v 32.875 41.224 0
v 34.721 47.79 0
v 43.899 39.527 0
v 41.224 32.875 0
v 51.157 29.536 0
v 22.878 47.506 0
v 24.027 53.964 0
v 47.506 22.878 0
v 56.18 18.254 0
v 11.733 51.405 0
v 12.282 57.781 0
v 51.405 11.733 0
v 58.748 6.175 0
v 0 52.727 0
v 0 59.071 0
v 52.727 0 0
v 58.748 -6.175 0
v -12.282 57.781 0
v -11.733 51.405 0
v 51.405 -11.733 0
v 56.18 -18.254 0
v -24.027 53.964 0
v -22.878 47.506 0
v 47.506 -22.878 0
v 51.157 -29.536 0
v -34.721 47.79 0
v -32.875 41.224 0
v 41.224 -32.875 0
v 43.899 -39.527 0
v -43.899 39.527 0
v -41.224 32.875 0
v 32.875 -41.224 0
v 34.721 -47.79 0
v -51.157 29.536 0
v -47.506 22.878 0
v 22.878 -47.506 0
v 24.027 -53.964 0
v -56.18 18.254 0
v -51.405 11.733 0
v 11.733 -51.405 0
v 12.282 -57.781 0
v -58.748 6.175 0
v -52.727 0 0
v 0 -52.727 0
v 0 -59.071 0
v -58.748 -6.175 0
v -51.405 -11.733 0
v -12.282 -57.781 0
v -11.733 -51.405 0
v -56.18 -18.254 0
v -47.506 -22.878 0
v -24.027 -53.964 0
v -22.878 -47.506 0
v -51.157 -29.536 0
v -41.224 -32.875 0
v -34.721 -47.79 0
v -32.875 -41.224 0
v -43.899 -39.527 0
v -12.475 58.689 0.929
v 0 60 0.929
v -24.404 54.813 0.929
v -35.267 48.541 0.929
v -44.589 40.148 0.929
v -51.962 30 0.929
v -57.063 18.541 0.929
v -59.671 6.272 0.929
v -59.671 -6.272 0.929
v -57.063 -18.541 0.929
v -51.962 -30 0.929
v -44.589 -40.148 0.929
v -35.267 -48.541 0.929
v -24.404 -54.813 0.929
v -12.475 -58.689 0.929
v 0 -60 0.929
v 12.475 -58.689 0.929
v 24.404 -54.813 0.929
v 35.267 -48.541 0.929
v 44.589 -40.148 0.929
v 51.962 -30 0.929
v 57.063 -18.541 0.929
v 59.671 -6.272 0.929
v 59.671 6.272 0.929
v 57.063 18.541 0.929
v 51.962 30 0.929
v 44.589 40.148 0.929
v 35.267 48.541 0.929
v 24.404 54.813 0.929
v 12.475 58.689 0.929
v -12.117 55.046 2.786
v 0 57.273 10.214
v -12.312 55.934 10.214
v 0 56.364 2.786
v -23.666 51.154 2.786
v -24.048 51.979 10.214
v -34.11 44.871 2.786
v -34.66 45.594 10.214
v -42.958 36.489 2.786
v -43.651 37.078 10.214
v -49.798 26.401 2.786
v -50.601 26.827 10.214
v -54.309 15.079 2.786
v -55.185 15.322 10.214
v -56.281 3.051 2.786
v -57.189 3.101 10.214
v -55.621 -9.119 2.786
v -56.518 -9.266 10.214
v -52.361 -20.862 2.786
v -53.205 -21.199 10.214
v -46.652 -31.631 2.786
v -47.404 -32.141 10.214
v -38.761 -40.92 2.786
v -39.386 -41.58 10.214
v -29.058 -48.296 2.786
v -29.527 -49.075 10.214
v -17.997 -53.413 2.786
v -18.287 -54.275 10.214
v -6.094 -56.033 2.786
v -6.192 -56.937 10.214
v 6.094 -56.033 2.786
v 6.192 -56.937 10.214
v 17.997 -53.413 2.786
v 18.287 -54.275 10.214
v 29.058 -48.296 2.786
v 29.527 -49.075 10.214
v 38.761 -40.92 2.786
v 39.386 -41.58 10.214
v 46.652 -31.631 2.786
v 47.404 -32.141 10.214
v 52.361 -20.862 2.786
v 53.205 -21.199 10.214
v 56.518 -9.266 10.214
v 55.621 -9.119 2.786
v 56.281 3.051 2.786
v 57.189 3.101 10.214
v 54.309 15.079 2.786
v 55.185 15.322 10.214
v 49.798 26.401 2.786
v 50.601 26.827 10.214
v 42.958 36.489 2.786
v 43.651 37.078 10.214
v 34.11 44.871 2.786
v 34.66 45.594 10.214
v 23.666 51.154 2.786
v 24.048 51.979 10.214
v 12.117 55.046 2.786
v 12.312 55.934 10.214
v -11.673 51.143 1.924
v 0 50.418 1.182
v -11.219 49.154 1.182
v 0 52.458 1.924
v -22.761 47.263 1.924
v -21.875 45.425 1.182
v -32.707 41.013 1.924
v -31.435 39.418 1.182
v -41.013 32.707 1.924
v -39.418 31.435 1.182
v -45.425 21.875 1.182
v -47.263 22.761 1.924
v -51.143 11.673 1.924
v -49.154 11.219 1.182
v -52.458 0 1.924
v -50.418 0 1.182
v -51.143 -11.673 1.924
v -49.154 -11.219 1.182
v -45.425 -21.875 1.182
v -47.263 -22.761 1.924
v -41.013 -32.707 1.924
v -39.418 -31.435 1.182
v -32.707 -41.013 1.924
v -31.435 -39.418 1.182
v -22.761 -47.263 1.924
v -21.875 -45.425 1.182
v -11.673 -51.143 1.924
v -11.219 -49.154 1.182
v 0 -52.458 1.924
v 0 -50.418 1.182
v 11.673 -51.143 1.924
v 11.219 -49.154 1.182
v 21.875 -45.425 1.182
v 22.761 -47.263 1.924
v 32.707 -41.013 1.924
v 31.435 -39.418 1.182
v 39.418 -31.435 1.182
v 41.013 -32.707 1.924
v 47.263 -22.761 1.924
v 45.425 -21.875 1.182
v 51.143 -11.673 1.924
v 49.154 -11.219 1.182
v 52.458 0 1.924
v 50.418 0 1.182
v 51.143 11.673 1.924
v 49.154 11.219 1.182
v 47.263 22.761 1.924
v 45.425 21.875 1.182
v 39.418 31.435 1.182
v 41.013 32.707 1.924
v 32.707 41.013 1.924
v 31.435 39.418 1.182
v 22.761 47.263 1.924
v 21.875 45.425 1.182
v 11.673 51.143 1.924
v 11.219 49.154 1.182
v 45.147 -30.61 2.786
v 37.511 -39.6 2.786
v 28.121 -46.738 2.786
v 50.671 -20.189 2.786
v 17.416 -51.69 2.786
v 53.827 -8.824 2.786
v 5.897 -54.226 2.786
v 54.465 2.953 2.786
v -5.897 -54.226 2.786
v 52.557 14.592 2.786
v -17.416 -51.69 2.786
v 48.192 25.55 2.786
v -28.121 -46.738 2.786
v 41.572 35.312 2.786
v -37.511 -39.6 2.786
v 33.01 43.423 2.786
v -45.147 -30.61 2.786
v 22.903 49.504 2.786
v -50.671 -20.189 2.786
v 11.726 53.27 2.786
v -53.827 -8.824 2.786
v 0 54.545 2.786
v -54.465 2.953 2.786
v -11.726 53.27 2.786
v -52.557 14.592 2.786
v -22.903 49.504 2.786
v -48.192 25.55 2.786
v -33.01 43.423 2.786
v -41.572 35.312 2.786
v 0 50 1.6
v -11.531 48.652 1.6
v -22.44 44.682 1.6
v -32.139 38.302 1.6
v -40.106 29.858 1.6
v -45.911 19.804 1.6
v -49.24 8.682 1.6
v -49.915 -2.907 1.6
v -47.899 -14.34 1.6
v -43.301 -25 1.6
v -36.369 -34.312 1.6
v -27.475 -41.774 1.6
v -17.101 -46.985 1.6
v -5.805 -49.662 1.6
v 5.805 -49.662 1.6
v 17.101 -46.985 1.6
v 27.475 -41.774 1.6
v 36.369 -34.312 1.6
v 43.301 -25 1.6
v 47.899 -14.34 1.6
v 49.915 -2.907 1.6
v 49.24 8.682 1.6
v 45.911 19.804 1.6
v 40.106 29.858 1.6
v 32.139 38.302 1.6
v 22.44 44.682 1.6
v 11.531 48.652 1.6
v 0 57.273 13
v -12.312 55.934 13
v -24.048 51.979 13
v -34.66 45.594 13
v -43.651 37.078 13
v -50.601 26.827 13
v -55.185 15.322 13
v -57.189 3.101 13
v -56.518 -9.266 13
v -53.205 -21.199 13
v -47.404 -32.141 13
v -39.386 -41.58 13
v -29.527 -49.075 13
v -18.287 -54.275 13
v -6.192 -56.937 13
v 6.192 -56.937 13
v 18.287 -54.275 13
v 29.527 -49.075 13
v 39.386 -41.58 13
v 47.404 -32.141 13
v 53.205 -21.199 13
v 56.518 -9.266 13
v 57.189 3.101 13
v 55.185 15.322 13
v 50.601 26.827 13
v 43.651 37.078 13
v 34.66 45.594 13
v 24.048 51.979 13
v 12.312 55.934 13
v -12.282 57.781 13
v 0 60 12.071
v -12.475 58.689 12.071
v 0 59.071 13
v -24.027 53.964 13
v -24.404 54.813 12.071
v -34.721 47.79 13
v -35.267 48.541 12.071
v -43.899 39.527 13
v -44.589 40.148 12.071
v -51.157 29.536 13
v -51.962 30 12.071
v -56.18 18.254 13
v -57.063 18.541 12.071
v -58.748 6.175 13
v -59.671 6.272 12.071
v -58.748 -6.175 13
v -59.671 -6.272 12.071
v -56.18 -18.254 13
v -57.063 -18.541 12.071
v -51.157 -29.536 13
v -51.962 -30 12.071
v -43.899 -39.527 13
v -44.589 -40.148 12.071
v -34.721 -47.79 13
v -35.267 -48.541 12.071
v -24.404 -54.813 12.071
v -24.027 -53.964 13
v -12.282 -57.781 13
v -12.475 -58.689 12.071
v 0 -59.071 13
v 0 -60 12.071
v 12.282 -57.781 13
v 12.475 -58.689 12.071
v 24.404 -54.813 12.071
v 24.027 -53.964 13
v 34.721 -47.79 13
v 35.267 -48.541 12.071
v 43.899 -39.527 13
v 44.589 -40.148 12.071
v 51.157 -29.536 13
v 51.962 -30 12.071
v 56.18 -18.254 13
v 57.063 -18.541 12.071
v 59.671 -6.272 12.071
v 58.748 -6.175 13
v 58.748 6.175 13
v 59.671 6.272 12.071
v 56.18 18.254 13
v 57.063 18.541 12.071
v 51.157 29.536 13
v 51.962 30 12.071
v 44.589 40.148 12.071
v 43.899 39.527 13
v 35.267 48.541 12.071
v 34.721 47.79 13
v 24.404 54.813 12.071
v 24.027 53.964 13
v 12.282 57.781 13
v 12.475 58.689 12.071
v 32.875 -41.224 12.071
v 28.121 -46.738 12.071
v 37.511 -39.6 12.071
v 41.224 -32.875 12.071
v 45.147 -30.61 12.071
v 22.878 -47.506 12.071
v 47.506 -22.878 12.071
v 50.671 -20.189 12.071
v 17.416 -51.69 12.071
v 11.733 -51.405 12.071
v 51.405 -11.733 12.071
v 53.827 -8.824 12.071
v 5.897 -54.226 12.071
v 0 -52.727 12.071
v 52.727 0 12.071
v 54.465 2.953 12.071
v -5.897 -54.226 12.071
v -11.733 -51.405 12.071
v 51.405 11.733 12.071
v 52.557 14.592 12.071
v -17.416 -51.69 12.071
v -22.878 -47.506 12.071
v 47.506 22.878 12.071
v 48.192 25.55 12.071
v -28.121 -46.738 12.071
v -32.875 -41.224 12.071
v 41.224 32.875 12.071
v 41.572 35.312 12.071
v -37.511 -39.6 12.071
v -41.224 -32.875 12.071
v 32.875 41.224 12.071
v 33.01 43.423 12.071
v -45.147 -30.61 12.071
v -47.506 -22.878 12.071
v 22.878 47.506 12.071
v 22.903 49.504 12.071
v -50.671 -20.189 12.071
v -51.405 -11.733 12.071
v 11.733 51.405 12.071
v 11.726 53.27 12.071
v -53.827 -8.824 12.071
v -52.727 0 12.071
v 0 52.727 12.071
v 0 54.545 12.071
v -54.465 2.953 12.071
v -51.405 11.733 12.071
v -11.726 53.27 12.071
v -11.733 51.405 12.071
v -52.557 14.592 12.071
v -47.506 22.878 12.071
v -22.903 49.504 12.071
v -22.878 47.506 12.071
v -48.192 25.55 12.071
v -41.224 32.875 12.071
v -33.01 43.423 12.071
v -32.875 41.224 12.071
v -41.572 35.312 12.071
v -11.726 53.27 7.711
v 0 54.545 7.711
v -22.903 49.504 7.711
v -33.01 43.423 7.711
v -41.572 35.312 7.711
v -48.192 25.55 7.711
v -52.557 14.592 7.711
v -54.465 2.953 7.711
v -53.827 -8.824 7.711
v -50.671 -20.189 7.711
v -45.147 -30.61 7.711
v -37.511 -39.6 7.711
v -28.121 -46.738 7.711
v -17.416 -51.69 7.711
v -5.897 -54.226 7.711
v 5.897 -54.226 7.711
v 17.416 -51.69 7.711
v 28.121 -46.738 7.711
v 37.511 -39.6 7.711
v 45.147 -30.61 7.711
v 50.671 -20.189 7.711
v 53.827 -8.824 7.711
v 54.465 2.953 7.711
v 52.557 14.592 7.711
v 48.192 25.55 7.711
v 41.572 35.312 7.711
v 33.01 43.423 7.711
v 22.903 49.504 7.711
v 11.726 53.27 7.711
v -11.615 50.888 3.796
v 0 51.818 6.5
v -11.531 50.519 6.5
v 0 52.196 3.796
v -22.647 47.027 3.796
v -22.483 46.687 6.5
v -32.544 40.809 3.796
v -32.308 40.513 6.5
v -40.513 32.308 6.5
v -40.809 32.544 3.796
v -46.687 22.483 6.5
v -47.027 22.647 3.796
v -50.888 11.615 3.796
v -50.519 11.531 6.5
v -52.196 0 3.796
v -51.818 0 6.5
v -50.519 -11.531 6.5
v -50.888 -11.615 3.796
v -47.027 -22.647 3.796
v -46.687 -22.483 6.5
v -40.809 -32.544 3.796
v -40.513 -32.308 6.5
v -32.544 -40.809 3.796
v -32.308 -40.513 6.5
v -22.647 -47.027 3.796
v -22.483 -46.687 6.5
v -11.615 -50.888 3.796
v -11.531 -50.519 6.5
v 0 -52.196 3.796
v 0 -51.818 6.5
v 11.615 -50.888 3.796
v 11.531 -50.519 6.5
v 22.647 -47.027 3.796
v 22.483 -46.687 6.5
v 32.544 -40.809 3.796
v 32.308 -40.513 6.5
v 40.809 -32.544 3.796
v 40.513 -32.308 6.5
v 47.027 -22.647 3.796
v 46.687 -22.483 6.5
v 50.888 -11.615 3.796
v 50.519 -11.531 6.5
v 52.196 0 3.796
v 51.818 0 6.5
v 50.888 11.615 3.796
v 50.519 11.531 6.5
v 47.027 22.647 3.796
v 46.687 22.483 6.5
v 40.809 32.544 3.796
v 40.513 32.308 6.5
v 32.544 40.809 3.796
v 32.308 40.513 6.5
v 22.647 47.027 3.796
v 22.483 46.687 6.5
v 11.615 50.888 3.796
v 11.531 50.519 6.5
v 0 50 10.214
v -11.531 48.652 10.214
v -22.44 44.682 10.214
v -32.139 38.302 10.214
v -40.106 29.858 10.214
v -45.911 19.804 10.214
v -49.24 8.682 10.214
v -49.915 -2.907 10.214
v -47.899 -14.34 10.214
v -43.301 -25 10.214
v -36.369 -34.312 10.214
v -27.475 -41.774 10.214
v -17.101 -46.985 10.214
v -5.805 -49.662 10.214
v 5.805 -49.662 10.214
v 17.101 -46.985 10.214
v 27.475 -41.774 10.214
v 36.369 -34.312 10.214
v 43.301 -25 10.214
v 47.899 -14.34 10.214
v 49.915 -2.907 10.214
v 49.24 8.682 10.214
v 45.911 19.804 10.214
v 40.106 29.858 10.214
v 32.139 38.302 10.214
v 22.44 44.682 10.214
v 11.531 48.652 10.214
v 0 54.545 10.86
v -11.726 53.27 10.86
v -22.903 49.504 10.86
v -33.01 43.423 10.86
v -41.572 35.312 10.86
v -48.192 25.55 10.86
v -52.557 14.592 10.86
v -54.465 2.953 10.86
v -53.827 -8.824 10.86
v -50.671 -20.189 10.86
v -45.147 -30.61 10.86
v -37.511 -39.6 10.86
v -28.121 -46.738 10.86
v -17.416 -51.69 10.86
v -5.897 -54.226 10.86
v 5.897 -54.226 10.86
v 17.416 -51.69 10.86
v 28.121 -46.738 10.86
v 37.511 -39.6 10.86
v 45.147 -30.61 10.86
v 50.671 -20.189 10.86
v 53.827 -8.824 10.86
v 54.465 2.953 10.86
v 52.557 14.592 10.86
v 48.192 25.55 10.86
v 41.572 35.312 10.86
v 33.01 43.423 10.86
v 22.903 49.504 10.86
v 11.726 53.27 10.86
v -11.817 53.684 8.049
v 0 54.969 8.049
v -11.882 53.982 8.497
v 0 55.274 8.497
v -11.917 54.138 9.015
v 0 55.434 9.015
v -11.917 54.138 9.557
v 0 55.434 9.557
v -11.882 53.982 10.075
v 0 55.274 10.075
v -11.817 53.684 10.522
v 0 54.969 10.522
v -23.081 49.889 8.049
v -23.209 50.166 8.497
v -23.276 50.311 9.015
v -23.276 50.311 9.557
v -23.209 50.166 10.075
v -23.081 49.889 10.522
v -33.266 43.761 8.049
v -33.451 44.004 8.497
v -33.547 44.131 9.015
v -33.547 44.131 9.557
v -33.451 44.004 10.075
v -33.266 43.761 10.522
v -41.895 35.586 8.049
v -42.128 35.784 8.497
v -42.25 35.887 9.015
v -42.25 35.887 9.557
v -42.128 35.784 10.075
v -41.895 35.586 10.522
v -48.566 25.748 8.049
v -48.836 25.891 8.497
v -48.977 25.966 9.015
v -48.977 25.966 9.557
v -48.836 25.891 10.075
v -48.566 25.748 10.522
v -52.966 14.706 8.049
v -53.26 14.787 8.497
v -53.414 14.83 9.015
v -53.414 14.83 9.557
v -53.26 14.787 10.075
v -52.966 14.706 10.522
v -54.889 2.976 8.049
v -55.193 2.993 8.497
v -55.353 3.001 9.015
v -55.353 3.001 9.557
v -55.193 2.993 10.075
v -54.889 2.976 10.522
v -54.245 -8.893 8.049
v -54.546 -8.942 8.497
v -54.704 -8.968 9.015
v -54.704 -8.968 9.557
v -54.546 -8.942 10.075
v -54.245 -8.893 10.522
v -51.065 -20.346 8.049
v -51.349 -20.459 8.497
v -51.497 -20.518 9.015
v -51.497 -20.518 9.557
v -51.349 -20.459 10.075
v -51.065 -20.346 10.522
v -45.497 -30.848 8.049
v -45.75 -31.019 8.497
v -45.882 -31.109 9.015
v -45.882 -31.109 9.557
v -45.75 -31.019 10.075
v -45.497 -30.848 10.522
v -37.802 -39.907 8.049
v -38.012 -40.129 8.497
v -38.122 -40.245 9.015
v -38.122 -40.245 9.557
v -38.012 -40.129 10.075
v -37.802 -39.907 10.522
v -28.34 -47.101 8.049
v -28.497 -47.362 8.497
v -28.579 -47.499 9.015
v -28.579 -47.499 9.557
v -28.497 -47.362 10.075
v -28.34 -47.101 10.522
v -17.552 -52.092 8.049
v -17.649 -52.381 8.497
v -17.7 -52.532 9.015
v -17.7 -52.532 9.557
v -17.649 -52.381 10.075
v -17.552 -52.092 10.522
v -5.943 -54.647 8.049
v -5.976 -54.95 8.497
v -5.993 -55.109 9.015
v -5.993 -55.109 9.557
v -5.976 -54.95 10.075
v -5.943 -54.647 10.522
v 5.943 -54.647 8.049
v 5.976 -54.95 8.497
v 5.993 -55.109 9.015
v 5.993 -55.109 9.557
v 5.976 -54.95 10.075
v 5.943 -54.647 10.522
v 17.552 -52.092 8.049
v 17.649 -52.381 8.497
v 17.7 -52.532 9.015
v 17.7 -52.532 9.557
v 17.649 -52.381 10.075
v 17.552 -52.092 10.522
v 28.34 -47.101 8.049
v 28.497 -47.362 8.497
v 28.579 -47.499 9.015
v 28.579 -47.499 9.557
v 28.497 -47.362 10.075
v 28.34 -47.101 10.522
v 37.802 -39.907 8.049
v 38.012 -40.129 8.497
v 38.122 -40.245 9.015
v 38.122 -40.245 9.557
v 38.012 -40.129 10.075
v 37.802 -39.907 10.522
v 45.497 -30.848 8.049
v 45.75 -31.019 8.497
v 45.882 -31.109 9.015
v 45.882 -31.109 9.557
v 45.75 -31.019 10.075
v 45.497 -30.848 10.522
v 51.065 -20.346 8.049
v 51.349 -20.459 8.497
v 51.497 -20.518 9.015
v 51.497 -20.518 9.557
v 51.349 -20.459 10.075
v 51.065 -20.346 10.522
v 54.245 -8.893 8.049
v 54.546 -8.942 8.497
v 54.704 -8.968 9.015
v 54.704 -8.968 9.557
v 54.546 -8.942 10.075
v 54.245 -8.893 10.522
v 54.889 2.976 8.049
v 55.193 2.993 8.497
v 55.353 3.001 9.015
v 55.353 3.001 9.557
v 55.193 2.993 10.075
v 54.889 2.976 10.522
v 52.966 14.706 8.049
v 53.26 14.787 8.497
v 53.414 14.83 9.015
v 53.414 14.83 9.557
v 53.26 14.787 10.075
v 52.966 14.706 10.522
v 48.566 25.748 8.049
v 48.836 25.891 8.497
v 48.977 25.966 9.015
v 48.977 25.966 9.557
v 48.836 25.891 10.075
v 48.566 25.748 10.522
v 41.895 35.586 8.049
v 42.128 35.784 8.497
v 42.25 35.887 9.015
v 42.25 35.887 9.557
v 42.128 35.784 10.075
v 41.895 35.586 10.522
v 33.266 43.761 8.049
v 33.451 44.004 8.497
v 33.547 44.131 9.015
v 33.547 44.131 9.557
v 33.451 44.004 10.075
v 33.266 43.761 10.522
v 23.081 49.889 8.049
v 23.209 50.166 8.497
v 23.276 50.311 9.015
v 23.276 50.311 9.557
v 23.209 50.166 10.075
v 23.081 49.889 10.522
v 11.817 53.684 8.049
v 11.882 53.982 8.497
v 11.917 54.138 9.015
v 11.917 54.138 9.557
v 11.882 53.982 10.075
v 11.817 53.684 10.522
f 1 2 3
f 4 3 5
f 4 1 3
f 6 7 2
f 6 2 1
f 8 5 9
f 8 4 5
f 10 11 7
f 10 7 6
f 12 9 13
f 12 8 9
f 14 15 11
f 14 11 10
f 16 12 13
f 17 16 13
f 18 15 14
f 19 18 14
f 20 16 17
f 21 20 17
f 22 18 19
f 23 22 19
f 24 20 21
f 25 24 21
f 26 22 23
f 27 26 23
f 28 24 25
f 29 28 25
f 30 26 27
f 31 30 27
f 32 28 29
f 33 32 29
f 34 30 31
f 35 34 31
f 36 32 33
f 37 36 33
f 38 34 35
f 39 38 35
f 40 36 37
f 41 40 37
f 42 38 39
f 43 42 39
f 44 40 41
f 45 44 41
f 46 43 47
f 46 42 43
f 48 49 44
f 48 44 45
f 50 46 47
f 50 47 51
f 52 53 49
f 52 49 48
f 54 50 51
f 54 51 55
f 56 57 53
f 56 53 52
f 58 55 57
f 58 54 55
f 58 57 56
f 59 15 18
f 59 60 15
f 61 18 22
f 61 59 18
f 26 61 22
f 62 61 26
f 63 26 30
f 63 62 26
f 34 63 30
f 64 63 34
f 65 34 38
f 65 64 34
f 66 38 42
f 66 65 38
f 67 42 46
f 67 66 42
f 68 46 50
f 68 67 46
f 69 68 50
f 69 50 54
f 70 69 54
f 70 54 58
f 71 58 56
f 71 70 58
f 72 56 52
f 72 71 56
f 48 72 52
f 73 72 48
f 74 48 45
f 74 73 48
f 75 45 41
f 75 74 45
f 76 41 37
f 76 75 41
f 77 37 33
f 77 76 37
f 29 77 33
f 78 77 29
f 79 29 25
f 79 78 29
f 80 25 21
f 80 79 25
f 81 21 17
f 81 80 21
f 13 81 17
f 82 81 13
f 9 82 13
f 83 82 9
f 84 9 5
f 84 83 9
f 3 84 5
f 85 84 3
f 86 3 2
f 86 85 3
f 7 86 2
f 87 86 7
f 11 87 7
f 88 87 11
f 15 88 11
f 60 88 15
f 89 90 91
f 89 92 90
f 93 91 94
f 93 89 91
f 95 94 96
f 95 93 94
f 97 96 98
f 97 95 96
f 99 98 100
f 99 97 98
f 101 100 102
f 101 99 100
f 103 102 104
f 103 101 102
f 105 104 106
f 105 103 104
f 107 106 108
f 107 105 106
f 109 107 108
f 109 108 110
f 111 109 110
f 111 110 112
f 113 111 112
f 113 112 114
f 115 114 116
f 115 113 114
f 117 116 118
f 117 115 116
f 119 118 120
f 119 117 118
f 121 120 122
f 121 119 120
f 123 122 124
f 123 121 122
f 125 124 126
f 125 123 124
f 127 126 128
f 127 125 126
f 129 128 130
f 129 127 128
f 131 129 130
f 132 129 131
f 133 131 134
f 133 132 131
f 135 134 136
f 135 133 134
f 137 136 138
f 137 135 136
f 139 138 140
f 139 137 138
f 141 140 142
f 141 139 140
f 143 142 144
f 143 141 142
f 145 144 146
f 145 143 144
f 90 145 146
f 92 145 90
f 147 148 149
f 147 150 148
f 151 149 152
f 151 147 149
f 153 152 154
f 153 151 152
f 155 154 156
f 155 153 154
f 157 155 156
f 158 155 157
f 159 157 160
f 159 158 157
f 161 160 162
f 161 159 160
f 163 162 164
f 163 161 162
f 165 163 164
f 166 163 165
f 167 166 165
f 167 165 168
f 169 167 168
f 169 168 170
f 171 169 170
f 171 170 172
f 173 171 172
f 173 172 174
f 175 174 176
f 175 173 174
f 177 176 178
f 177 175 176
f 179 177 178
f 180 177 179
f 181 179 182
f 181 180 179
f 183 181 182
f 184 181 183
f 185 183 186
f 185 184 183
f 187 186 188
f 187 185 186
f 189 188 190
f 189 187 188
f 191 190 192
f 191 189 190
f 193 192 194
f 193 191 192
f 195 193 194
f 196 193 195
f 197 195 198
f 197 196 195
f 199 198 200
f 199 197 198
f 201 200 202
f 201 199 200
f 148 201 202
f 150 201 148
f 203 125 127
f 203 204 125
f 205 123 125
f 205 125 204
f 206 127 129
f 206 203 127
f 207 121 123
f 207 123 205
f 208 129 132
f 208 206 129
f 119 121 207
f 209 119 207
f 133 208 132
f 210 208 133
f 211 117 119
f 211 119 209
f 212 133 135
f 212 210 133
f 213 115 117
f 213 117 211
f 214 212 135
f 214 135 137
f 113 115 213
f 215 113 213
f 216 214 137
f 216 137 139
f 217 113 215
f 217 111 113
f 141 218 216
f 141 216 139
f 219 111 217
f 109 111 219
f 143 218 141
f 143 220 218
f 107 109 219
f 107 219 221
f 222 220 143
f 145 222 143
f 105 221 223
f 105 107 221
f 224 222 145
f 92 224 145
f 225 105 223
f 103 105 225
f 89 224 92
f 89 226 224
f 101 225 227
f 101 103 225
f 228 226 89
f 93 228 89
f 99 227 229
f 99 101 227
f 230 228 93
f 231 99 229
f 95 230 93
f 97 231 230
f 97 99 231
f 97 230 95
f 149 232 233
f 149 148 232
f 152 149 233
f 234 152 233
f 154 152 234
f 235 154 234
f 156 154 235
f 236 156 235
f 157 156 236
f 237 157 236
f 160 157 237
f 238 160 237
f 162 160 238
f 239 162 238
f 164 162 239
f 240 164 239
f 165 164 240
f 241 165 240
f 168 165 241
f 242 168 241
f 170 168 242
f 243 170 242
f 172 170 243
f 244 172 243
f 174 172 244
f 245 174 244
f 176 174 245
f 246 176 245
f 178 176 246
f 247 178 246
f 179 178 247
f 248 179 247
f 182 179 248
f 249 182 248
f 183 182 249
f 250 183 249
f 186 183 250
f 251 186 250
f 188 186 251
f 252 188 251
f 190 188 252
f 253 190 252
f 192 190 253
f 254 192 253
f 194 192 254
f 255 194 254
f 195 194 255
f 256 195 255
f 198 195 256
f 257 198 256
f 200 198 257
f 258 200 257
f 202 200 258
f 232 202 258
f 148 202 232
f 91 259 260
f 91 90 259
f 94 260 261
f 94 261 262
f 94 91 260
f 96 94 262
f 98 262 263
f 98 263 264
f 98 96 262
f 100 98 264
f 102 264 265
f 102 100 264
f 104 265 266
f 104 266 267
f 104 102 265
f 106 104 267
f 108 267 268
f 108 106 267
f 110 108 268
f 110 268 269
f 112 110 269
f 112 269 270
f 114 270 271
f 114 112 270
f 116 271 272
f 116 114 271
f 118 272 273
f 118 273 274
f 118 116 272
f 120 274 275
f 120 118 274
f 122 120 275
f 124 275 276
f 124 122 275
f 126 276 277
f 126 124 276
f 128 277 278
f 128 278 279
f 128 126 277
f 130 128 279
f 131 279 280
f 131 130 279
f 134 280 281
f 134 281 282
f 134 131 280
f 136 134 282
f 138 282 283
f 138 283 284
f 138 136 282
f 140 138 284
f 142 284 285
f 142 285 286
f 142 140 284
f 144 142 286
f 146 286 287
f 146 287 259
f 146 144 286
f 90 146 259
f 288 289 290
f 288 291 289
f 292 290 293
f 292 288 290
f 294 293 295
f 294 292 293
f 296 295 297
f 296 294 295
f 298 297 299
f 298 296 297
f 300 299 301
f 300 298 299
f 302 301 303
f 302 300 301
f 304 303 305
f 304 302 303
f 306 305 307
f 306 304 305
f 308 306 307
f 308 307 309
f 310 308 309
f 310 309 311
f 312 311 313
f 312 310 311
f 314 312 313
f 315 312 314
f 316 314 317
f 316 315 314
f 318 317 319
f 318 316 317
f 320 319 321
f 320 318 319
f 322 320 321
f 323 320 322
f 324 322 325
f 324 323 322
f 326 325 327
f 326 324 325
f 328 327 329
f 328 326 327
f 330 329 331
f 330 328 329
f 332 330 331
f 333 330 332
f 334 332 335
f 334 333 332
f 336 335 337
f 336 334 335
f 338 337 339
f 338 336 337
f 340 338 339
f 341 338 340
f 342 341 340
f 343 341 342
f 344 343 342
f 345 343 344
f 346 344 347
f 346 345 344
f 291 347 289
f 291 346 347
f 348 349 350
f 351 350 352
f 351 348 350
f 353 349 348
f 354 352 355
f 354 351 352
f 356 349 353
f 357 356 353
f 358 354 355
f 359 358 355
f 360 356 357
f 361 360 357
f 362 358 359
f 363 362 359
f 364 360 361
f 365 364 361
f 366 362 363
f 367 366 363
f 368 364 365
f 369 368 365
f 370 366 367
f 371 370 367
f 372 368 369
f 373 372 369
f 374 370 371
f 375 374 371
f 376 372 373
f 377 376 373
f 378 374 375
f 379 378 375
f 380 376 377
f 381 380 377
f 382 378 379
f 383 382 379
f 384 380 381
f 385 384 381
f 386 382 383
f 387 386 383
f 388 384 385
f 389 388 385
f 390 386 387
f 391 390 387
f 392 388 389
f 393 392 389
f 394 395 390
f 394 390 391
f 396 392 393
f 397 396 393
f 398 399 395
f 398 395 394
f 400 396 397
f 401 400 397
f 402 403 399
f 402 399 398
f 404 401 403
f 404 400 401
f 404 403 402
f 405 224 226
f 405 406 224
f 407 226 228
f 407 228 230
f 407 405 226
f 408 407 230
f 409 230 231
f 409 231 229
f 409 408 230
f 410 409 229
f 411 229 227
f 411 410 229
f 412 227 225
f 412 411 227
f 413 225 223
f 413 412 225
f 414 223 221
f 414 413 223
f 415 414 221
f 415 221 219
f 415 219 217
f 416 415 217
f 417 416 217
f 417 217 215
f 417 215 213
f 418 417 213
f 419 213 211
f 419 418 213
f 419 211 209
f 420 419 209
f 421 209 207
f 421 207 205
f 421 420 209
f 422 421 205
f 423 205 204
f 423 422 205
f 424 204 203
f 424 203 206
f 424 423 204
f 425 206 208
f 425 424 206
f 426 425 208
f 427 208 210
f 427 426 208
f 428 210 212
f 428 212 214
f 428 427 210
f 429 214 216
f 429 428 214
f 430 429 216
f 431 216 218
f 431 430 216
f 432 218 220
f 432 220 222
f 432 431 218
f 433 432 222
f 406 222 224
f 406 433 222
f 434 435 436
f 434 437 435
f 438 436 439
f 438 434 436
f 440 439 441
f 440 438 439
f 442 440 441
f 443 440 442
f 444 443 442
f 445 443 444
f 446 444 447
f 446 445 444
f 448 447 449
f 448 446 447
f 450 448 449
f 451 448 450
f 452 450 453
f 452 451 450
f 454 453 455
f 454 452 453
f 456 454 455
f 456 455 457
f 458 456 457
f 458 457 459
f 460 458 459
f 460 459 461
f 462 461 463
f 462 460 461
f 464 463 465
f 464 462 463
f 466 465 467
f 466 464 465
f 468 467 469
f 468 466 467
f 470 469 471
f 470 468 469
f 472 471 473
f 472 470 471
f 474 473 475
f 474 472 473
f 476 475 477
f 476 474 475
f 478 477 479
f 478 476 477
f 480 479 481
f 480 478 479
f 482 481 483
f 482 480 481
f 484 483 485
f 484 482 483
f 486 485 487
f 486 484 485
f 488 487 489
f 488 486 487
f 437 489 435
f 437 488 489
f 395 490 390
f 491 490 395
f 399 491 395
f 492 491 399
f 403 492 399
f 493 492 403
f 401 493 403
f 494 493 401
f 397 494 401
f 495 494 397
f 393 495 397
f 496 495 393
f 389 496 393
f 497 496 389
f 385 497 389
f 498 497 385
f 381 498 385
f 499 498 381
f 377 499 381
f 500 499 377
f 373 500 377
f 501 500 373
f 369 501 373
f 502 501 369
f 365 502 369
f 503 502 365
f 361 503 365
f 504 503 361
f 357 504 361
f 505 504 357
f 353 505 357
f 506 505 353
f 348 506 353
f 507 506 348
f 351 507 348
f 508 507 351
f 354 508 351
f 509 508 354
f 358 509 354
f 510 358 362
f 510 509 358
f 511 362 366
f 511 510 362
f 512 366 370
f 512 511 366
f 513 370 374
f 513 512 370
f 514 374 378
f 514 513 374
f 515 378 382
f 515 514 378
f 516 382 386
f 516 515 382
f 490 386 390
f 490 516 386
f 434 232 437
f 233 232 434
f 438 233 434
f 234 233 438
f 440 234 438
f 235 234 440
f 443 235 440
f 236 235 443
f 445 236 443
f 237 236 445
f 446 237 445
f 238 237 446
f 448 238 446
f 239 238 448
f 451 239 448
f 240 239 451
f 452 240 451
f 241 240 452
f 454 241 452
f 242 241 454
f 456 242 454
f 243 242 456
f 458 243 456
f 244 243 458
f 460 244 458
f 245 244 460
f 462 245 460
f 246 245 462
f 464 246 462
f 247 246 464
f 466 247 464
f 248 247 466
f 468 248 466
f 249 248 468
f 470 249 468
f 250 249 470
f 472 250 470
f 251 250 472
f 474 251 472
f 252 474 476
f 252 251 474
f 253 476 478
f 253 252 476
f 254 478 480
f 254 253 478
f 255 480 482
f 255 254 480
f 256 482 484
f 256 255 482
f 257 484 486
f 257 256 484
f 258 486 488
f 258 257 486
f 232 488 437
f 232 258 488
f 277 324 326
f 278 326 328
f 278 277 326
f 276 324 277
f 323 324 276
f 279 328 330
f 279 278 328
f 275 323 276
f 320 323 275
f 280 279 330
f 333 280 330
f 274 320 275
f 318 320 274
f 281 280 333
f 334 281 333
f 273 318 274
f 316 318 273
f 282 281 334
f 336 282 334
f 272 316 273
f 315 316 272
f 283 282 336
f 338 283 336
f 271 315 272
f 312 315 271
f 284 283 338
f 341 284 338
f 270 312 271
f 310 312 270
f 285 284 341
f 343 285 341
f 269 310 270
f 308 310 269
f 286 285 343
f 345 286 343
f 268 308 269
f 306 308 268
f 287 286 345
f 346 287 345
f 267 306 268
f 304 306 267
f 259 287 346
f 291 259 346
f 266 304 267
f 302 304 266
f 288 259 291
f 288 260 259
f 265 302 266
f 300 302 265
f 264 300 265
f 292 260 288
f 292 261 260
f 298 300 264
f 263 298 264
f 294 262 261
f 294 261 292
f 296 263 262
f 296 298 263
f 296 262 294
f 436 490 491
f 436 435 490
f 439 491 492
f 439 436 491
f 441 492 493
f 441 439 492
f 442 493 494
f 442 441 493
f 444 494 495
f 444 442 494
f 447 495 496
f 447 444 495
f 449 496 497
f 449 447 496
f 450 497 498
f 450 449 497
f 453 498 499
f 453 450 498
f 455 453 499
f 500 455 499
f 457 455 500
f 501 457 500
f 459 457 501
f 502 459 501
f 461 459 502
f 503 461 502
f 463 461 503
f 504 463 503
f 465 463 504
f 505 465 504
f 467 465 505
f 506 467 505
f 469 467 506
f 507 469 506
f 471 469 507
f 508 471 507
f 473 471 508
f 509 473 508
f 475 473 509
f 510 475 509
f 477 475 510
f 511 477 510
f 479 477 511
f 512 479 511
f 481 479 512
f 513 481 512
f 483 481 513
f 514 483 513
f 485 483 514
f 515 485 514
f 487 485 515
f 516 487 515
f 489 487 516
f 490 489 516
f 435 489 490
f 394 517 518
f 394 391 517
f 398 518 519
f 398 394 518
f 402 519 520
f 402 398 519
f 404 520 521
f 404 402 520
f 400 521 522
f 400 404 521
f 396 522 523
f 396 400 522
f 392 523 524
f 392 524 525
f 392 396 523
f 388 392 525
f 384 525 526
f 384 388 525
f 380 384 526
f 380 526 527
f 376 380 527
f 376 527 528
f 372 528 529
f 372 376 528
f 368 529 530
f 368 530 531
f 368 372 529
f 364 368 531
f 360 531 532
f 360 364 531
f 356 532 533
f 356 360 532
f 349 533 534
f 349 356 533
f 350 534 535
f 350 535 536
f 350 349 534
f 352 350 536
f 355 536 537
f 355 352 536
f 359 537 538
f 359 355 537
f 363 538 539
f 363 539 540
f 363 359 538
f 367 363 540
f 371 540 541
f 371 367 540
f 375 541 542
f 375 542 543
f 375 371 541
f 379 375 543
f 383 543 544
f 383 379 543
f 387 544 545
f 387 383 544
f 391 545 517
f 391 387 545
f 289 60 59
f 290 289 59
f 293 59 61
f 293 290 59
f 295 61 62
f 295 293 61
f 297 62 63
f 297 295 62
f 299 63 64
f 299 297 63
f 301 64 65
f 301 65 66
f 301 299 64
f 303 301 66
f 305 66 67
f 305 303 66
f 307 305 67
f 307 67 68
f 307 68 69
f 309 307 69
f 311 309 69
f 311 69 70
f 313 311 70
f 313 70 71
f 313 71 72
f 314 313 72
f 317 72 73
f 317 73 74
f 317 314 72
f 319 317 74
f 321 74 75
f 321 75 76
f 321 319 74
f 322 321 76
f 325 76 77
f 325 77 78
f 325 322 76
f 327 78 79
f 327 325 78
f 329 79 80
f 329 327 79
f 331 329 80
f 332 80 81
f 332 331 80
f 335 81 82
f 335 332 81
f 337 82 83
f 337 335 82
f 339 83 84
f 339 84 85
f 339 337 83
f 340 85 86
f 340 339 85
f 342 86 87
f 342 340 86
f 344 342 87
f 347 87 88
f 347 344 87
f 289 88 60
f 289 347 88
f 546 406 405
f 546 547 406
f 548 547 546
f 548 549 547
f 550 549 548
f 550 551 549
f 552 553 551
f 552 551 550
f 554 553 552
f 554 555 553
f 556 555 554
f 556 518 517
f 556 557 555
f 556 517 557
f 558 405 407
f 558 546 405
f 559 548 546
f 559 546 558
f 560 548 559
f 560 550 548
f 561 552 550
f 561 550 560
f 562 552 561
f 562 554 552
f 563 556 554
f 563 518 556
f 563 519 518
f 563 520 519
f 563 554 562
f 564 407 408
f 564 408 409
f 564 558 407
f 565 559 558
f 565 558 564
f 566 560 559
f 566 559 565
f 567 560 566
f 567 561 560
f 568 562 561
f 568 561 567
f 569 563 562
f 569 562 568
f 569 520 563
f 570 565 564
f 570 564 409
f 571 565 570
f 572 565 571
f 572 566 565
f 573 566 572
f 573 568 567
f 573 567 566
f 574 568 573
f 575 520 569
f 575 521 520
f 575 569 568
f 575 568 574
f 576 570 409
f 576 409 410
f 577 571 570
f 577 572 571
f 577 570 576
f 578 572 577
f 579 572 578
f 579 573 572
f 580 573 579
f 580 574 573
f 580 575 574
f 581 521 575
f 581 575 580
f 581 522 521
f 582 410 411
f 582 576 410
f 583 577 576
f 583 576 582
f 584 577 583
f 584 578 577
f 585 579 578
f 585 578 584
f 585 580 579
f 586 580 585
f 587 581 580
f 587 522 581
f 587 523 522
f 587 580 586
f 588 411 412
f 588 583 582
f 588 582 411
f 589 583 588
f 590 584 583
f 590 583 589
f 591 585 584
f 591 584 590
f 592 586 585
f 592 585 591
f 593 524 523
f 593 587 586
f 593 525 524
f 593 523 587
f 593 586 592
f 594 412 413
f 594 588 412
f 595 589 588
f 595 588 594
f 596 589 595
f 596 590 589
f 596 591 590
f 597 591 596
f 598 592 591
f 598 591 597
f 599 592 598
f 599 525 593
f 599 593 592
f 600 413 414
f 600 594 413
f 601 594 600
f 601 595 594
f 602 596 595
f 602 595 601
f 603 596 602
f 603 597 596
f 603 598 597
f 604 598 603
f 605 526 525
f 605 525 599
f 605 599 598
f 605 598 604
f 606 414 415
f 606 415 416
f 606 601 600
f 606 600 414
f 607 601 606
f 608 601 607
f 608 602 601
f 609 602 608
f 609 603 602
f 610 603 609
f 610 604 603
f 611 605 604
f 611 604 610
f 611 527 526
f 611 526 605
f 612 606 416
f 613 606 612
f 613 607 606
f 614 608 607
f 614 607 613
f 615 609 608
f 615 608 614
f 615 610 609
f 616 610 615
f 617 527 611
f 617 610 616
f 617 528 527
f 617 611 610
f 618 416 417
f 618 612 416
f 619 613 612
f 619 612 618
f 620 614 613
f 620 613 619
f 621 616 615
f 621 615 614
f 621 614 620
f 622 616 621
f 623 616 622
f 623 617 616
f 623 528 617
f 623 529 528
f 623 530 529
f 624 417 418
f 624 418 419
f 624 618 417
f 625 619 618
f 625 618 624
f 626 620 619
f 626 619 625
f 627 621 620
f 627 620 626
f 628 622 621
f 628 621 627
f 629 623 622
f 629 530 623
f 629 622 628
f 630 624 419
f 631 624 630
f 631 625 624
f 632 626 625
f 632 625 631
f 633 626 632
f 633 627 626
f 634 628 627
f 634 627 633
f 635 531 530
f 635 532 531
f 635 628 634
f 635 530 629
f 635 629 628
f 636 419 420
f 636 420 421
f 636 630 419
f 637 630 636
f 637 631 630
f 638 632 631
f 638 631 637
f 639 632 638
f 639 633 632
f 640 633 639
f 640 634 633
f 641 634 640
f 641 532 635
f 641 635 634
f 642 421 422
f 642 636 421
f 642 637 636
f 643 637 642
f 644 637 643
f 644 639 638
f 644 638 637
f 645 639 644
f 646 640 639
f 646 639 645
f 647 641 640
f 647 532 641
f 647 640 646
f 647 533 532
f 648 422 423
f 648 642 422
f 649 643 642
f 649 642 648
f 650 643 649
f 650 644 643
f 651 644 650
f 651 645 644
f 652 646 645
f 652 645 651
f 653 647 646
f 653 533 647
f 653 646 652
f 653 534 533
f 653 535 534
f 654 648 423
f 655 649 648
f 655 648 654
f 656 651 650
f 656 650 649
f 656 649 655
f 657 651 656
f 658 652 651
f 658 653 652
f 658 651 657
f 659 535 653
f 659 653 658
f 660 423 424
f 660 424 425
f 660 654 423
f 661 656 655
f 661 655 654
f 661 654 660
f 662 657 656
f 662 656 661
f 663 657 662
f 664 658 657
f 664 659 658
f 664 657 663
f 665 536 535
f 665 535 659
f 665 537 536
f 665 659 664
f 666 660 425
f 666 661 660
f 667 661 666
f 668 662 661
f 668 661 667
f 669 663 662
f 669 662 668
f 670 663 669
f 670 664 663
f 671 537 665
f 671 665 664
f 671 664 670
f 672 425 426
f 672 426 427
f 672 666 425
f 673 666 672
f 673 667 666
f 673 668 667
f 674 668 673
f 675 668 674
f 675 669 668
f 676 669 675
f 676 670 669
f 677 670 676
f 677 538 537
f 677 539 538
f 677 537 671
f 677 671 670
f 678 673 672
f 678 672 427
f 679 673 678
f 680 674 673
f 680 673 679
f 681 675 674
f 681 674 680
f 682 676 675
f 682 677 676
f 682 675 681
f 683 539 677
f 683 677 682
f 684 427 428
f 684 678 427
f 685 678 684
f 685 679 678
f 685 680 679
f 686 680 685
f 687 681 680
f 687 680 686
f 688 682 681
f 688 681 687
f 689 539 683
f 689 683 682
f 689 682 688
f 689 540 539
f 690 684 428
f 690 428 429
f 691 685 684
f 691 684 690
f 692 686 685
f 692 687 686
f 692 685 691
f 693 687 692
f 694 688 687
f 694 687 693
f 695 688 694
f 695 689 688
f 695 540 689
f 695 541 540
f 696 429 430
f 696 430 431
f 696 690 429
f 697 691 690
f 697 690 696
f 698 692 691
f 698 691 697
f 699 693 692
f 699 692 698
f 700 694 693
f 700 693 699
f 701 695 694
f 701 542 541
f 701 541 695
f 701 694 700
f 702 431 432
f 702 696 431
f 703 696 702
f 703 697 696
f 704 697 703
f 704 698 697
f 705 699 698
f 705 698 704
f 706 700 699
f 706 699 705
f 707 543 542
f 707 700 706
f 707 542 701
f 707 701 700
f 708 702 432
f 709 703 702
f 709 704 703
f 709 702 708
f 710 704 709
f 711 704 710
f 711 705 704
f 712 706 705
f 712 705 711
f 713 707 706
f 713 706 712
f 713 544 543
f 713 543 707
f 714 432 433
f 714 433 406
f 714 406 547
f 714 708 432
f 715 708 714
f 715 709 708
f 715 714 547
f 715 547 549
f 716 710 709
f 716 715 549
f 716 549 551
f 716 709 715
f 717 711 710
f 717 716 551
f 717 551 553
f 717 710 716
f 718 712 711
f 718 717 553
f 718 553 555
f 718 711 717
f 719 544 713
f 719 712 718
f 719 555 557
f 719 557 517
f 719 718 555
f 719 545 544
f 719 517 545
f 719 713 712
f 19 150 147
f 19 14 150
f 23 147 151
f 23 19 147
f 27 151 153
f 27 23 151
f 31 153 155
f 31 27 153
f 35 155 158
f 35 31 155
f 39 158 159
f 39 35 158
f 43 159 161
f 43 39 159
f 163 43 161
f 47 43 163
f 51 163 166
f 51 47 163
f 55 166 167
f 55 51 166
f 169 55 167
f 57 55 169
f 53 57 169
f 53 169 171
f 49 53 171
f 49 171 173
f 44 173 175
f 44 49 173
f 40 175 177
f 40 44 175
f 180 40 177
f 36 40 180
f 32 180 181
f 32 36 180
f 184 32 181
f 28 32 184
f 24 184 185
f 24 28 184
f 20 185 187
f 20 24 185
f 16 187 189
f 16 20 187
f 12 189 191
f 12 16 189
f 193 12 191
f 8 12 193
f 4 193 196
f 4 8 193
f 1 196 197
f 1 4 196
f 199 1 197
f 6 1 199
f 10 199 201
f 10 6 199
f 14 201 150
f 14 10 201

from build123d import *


with BuildPart() as part:
    # 스케치1 → 회전1 (revolve)
    with BuildSketch(Plane(origin=(0, 0, 0), x_dir=(0, 0, -1), z_dir=(1, 0, 0))):
        with BuildLine():
            Line((-10.214285714, 57.272727273), (-2.785714286, 56.363636364))
            Line((-2.785714286, 56.363636364), (-2.785714286, 54.545454545))
            Line((-2.785714286, 54.545454545), (-7.711122642, 54.545454545))
            ThreePointArc((-7.711122642, 54.545454545), (-9.285714286, 55.454545455), (-10.860305929, 54.545454545))
            Line((-10.860305929, 54.545454545), (-12.071428571, 54.545454545))
            Line((-12.071428571, 54.545454545), (-12.071428571, 52.727272727))
            Line((-12.071428571, 52.727272727), (-10.214285714, 50))
            Line((-10.214285714, 50), (-6.5, 51.818181818))
            Line((-6.5, 51.818181818), (-3.796015479, 52.196361472))
            Line((-3.796015479, 52.196361472), (-1.599654007, 50))
            Line((-1.599654007, 50), (-1.181818182, 50.417835825))
            Line((-1.181818182, 50.417835825), (-1.924421913, 52.458122809))
            Line((-1.924421913, 52.458122809), (0, 52.727272727))
            Line((0, 52.727272727), (0, 59.071428571))
            Line((0, 59.071428571), (-0.928571429, 60))
            Line((-0.928571429, 60), (-12.071428571, 60))
            Line((-12.071428571, 60), (-13, 59.071428571))
            Line((-13, 59.071428571), (-13, 57.272727273))
            Line((-13, 57.272727273), (-10.214285714, 57.272727273))
        make_face()
    revolve(axis=Axis((0, 0, 0), (0, 0, 1)))


solid = part.part
